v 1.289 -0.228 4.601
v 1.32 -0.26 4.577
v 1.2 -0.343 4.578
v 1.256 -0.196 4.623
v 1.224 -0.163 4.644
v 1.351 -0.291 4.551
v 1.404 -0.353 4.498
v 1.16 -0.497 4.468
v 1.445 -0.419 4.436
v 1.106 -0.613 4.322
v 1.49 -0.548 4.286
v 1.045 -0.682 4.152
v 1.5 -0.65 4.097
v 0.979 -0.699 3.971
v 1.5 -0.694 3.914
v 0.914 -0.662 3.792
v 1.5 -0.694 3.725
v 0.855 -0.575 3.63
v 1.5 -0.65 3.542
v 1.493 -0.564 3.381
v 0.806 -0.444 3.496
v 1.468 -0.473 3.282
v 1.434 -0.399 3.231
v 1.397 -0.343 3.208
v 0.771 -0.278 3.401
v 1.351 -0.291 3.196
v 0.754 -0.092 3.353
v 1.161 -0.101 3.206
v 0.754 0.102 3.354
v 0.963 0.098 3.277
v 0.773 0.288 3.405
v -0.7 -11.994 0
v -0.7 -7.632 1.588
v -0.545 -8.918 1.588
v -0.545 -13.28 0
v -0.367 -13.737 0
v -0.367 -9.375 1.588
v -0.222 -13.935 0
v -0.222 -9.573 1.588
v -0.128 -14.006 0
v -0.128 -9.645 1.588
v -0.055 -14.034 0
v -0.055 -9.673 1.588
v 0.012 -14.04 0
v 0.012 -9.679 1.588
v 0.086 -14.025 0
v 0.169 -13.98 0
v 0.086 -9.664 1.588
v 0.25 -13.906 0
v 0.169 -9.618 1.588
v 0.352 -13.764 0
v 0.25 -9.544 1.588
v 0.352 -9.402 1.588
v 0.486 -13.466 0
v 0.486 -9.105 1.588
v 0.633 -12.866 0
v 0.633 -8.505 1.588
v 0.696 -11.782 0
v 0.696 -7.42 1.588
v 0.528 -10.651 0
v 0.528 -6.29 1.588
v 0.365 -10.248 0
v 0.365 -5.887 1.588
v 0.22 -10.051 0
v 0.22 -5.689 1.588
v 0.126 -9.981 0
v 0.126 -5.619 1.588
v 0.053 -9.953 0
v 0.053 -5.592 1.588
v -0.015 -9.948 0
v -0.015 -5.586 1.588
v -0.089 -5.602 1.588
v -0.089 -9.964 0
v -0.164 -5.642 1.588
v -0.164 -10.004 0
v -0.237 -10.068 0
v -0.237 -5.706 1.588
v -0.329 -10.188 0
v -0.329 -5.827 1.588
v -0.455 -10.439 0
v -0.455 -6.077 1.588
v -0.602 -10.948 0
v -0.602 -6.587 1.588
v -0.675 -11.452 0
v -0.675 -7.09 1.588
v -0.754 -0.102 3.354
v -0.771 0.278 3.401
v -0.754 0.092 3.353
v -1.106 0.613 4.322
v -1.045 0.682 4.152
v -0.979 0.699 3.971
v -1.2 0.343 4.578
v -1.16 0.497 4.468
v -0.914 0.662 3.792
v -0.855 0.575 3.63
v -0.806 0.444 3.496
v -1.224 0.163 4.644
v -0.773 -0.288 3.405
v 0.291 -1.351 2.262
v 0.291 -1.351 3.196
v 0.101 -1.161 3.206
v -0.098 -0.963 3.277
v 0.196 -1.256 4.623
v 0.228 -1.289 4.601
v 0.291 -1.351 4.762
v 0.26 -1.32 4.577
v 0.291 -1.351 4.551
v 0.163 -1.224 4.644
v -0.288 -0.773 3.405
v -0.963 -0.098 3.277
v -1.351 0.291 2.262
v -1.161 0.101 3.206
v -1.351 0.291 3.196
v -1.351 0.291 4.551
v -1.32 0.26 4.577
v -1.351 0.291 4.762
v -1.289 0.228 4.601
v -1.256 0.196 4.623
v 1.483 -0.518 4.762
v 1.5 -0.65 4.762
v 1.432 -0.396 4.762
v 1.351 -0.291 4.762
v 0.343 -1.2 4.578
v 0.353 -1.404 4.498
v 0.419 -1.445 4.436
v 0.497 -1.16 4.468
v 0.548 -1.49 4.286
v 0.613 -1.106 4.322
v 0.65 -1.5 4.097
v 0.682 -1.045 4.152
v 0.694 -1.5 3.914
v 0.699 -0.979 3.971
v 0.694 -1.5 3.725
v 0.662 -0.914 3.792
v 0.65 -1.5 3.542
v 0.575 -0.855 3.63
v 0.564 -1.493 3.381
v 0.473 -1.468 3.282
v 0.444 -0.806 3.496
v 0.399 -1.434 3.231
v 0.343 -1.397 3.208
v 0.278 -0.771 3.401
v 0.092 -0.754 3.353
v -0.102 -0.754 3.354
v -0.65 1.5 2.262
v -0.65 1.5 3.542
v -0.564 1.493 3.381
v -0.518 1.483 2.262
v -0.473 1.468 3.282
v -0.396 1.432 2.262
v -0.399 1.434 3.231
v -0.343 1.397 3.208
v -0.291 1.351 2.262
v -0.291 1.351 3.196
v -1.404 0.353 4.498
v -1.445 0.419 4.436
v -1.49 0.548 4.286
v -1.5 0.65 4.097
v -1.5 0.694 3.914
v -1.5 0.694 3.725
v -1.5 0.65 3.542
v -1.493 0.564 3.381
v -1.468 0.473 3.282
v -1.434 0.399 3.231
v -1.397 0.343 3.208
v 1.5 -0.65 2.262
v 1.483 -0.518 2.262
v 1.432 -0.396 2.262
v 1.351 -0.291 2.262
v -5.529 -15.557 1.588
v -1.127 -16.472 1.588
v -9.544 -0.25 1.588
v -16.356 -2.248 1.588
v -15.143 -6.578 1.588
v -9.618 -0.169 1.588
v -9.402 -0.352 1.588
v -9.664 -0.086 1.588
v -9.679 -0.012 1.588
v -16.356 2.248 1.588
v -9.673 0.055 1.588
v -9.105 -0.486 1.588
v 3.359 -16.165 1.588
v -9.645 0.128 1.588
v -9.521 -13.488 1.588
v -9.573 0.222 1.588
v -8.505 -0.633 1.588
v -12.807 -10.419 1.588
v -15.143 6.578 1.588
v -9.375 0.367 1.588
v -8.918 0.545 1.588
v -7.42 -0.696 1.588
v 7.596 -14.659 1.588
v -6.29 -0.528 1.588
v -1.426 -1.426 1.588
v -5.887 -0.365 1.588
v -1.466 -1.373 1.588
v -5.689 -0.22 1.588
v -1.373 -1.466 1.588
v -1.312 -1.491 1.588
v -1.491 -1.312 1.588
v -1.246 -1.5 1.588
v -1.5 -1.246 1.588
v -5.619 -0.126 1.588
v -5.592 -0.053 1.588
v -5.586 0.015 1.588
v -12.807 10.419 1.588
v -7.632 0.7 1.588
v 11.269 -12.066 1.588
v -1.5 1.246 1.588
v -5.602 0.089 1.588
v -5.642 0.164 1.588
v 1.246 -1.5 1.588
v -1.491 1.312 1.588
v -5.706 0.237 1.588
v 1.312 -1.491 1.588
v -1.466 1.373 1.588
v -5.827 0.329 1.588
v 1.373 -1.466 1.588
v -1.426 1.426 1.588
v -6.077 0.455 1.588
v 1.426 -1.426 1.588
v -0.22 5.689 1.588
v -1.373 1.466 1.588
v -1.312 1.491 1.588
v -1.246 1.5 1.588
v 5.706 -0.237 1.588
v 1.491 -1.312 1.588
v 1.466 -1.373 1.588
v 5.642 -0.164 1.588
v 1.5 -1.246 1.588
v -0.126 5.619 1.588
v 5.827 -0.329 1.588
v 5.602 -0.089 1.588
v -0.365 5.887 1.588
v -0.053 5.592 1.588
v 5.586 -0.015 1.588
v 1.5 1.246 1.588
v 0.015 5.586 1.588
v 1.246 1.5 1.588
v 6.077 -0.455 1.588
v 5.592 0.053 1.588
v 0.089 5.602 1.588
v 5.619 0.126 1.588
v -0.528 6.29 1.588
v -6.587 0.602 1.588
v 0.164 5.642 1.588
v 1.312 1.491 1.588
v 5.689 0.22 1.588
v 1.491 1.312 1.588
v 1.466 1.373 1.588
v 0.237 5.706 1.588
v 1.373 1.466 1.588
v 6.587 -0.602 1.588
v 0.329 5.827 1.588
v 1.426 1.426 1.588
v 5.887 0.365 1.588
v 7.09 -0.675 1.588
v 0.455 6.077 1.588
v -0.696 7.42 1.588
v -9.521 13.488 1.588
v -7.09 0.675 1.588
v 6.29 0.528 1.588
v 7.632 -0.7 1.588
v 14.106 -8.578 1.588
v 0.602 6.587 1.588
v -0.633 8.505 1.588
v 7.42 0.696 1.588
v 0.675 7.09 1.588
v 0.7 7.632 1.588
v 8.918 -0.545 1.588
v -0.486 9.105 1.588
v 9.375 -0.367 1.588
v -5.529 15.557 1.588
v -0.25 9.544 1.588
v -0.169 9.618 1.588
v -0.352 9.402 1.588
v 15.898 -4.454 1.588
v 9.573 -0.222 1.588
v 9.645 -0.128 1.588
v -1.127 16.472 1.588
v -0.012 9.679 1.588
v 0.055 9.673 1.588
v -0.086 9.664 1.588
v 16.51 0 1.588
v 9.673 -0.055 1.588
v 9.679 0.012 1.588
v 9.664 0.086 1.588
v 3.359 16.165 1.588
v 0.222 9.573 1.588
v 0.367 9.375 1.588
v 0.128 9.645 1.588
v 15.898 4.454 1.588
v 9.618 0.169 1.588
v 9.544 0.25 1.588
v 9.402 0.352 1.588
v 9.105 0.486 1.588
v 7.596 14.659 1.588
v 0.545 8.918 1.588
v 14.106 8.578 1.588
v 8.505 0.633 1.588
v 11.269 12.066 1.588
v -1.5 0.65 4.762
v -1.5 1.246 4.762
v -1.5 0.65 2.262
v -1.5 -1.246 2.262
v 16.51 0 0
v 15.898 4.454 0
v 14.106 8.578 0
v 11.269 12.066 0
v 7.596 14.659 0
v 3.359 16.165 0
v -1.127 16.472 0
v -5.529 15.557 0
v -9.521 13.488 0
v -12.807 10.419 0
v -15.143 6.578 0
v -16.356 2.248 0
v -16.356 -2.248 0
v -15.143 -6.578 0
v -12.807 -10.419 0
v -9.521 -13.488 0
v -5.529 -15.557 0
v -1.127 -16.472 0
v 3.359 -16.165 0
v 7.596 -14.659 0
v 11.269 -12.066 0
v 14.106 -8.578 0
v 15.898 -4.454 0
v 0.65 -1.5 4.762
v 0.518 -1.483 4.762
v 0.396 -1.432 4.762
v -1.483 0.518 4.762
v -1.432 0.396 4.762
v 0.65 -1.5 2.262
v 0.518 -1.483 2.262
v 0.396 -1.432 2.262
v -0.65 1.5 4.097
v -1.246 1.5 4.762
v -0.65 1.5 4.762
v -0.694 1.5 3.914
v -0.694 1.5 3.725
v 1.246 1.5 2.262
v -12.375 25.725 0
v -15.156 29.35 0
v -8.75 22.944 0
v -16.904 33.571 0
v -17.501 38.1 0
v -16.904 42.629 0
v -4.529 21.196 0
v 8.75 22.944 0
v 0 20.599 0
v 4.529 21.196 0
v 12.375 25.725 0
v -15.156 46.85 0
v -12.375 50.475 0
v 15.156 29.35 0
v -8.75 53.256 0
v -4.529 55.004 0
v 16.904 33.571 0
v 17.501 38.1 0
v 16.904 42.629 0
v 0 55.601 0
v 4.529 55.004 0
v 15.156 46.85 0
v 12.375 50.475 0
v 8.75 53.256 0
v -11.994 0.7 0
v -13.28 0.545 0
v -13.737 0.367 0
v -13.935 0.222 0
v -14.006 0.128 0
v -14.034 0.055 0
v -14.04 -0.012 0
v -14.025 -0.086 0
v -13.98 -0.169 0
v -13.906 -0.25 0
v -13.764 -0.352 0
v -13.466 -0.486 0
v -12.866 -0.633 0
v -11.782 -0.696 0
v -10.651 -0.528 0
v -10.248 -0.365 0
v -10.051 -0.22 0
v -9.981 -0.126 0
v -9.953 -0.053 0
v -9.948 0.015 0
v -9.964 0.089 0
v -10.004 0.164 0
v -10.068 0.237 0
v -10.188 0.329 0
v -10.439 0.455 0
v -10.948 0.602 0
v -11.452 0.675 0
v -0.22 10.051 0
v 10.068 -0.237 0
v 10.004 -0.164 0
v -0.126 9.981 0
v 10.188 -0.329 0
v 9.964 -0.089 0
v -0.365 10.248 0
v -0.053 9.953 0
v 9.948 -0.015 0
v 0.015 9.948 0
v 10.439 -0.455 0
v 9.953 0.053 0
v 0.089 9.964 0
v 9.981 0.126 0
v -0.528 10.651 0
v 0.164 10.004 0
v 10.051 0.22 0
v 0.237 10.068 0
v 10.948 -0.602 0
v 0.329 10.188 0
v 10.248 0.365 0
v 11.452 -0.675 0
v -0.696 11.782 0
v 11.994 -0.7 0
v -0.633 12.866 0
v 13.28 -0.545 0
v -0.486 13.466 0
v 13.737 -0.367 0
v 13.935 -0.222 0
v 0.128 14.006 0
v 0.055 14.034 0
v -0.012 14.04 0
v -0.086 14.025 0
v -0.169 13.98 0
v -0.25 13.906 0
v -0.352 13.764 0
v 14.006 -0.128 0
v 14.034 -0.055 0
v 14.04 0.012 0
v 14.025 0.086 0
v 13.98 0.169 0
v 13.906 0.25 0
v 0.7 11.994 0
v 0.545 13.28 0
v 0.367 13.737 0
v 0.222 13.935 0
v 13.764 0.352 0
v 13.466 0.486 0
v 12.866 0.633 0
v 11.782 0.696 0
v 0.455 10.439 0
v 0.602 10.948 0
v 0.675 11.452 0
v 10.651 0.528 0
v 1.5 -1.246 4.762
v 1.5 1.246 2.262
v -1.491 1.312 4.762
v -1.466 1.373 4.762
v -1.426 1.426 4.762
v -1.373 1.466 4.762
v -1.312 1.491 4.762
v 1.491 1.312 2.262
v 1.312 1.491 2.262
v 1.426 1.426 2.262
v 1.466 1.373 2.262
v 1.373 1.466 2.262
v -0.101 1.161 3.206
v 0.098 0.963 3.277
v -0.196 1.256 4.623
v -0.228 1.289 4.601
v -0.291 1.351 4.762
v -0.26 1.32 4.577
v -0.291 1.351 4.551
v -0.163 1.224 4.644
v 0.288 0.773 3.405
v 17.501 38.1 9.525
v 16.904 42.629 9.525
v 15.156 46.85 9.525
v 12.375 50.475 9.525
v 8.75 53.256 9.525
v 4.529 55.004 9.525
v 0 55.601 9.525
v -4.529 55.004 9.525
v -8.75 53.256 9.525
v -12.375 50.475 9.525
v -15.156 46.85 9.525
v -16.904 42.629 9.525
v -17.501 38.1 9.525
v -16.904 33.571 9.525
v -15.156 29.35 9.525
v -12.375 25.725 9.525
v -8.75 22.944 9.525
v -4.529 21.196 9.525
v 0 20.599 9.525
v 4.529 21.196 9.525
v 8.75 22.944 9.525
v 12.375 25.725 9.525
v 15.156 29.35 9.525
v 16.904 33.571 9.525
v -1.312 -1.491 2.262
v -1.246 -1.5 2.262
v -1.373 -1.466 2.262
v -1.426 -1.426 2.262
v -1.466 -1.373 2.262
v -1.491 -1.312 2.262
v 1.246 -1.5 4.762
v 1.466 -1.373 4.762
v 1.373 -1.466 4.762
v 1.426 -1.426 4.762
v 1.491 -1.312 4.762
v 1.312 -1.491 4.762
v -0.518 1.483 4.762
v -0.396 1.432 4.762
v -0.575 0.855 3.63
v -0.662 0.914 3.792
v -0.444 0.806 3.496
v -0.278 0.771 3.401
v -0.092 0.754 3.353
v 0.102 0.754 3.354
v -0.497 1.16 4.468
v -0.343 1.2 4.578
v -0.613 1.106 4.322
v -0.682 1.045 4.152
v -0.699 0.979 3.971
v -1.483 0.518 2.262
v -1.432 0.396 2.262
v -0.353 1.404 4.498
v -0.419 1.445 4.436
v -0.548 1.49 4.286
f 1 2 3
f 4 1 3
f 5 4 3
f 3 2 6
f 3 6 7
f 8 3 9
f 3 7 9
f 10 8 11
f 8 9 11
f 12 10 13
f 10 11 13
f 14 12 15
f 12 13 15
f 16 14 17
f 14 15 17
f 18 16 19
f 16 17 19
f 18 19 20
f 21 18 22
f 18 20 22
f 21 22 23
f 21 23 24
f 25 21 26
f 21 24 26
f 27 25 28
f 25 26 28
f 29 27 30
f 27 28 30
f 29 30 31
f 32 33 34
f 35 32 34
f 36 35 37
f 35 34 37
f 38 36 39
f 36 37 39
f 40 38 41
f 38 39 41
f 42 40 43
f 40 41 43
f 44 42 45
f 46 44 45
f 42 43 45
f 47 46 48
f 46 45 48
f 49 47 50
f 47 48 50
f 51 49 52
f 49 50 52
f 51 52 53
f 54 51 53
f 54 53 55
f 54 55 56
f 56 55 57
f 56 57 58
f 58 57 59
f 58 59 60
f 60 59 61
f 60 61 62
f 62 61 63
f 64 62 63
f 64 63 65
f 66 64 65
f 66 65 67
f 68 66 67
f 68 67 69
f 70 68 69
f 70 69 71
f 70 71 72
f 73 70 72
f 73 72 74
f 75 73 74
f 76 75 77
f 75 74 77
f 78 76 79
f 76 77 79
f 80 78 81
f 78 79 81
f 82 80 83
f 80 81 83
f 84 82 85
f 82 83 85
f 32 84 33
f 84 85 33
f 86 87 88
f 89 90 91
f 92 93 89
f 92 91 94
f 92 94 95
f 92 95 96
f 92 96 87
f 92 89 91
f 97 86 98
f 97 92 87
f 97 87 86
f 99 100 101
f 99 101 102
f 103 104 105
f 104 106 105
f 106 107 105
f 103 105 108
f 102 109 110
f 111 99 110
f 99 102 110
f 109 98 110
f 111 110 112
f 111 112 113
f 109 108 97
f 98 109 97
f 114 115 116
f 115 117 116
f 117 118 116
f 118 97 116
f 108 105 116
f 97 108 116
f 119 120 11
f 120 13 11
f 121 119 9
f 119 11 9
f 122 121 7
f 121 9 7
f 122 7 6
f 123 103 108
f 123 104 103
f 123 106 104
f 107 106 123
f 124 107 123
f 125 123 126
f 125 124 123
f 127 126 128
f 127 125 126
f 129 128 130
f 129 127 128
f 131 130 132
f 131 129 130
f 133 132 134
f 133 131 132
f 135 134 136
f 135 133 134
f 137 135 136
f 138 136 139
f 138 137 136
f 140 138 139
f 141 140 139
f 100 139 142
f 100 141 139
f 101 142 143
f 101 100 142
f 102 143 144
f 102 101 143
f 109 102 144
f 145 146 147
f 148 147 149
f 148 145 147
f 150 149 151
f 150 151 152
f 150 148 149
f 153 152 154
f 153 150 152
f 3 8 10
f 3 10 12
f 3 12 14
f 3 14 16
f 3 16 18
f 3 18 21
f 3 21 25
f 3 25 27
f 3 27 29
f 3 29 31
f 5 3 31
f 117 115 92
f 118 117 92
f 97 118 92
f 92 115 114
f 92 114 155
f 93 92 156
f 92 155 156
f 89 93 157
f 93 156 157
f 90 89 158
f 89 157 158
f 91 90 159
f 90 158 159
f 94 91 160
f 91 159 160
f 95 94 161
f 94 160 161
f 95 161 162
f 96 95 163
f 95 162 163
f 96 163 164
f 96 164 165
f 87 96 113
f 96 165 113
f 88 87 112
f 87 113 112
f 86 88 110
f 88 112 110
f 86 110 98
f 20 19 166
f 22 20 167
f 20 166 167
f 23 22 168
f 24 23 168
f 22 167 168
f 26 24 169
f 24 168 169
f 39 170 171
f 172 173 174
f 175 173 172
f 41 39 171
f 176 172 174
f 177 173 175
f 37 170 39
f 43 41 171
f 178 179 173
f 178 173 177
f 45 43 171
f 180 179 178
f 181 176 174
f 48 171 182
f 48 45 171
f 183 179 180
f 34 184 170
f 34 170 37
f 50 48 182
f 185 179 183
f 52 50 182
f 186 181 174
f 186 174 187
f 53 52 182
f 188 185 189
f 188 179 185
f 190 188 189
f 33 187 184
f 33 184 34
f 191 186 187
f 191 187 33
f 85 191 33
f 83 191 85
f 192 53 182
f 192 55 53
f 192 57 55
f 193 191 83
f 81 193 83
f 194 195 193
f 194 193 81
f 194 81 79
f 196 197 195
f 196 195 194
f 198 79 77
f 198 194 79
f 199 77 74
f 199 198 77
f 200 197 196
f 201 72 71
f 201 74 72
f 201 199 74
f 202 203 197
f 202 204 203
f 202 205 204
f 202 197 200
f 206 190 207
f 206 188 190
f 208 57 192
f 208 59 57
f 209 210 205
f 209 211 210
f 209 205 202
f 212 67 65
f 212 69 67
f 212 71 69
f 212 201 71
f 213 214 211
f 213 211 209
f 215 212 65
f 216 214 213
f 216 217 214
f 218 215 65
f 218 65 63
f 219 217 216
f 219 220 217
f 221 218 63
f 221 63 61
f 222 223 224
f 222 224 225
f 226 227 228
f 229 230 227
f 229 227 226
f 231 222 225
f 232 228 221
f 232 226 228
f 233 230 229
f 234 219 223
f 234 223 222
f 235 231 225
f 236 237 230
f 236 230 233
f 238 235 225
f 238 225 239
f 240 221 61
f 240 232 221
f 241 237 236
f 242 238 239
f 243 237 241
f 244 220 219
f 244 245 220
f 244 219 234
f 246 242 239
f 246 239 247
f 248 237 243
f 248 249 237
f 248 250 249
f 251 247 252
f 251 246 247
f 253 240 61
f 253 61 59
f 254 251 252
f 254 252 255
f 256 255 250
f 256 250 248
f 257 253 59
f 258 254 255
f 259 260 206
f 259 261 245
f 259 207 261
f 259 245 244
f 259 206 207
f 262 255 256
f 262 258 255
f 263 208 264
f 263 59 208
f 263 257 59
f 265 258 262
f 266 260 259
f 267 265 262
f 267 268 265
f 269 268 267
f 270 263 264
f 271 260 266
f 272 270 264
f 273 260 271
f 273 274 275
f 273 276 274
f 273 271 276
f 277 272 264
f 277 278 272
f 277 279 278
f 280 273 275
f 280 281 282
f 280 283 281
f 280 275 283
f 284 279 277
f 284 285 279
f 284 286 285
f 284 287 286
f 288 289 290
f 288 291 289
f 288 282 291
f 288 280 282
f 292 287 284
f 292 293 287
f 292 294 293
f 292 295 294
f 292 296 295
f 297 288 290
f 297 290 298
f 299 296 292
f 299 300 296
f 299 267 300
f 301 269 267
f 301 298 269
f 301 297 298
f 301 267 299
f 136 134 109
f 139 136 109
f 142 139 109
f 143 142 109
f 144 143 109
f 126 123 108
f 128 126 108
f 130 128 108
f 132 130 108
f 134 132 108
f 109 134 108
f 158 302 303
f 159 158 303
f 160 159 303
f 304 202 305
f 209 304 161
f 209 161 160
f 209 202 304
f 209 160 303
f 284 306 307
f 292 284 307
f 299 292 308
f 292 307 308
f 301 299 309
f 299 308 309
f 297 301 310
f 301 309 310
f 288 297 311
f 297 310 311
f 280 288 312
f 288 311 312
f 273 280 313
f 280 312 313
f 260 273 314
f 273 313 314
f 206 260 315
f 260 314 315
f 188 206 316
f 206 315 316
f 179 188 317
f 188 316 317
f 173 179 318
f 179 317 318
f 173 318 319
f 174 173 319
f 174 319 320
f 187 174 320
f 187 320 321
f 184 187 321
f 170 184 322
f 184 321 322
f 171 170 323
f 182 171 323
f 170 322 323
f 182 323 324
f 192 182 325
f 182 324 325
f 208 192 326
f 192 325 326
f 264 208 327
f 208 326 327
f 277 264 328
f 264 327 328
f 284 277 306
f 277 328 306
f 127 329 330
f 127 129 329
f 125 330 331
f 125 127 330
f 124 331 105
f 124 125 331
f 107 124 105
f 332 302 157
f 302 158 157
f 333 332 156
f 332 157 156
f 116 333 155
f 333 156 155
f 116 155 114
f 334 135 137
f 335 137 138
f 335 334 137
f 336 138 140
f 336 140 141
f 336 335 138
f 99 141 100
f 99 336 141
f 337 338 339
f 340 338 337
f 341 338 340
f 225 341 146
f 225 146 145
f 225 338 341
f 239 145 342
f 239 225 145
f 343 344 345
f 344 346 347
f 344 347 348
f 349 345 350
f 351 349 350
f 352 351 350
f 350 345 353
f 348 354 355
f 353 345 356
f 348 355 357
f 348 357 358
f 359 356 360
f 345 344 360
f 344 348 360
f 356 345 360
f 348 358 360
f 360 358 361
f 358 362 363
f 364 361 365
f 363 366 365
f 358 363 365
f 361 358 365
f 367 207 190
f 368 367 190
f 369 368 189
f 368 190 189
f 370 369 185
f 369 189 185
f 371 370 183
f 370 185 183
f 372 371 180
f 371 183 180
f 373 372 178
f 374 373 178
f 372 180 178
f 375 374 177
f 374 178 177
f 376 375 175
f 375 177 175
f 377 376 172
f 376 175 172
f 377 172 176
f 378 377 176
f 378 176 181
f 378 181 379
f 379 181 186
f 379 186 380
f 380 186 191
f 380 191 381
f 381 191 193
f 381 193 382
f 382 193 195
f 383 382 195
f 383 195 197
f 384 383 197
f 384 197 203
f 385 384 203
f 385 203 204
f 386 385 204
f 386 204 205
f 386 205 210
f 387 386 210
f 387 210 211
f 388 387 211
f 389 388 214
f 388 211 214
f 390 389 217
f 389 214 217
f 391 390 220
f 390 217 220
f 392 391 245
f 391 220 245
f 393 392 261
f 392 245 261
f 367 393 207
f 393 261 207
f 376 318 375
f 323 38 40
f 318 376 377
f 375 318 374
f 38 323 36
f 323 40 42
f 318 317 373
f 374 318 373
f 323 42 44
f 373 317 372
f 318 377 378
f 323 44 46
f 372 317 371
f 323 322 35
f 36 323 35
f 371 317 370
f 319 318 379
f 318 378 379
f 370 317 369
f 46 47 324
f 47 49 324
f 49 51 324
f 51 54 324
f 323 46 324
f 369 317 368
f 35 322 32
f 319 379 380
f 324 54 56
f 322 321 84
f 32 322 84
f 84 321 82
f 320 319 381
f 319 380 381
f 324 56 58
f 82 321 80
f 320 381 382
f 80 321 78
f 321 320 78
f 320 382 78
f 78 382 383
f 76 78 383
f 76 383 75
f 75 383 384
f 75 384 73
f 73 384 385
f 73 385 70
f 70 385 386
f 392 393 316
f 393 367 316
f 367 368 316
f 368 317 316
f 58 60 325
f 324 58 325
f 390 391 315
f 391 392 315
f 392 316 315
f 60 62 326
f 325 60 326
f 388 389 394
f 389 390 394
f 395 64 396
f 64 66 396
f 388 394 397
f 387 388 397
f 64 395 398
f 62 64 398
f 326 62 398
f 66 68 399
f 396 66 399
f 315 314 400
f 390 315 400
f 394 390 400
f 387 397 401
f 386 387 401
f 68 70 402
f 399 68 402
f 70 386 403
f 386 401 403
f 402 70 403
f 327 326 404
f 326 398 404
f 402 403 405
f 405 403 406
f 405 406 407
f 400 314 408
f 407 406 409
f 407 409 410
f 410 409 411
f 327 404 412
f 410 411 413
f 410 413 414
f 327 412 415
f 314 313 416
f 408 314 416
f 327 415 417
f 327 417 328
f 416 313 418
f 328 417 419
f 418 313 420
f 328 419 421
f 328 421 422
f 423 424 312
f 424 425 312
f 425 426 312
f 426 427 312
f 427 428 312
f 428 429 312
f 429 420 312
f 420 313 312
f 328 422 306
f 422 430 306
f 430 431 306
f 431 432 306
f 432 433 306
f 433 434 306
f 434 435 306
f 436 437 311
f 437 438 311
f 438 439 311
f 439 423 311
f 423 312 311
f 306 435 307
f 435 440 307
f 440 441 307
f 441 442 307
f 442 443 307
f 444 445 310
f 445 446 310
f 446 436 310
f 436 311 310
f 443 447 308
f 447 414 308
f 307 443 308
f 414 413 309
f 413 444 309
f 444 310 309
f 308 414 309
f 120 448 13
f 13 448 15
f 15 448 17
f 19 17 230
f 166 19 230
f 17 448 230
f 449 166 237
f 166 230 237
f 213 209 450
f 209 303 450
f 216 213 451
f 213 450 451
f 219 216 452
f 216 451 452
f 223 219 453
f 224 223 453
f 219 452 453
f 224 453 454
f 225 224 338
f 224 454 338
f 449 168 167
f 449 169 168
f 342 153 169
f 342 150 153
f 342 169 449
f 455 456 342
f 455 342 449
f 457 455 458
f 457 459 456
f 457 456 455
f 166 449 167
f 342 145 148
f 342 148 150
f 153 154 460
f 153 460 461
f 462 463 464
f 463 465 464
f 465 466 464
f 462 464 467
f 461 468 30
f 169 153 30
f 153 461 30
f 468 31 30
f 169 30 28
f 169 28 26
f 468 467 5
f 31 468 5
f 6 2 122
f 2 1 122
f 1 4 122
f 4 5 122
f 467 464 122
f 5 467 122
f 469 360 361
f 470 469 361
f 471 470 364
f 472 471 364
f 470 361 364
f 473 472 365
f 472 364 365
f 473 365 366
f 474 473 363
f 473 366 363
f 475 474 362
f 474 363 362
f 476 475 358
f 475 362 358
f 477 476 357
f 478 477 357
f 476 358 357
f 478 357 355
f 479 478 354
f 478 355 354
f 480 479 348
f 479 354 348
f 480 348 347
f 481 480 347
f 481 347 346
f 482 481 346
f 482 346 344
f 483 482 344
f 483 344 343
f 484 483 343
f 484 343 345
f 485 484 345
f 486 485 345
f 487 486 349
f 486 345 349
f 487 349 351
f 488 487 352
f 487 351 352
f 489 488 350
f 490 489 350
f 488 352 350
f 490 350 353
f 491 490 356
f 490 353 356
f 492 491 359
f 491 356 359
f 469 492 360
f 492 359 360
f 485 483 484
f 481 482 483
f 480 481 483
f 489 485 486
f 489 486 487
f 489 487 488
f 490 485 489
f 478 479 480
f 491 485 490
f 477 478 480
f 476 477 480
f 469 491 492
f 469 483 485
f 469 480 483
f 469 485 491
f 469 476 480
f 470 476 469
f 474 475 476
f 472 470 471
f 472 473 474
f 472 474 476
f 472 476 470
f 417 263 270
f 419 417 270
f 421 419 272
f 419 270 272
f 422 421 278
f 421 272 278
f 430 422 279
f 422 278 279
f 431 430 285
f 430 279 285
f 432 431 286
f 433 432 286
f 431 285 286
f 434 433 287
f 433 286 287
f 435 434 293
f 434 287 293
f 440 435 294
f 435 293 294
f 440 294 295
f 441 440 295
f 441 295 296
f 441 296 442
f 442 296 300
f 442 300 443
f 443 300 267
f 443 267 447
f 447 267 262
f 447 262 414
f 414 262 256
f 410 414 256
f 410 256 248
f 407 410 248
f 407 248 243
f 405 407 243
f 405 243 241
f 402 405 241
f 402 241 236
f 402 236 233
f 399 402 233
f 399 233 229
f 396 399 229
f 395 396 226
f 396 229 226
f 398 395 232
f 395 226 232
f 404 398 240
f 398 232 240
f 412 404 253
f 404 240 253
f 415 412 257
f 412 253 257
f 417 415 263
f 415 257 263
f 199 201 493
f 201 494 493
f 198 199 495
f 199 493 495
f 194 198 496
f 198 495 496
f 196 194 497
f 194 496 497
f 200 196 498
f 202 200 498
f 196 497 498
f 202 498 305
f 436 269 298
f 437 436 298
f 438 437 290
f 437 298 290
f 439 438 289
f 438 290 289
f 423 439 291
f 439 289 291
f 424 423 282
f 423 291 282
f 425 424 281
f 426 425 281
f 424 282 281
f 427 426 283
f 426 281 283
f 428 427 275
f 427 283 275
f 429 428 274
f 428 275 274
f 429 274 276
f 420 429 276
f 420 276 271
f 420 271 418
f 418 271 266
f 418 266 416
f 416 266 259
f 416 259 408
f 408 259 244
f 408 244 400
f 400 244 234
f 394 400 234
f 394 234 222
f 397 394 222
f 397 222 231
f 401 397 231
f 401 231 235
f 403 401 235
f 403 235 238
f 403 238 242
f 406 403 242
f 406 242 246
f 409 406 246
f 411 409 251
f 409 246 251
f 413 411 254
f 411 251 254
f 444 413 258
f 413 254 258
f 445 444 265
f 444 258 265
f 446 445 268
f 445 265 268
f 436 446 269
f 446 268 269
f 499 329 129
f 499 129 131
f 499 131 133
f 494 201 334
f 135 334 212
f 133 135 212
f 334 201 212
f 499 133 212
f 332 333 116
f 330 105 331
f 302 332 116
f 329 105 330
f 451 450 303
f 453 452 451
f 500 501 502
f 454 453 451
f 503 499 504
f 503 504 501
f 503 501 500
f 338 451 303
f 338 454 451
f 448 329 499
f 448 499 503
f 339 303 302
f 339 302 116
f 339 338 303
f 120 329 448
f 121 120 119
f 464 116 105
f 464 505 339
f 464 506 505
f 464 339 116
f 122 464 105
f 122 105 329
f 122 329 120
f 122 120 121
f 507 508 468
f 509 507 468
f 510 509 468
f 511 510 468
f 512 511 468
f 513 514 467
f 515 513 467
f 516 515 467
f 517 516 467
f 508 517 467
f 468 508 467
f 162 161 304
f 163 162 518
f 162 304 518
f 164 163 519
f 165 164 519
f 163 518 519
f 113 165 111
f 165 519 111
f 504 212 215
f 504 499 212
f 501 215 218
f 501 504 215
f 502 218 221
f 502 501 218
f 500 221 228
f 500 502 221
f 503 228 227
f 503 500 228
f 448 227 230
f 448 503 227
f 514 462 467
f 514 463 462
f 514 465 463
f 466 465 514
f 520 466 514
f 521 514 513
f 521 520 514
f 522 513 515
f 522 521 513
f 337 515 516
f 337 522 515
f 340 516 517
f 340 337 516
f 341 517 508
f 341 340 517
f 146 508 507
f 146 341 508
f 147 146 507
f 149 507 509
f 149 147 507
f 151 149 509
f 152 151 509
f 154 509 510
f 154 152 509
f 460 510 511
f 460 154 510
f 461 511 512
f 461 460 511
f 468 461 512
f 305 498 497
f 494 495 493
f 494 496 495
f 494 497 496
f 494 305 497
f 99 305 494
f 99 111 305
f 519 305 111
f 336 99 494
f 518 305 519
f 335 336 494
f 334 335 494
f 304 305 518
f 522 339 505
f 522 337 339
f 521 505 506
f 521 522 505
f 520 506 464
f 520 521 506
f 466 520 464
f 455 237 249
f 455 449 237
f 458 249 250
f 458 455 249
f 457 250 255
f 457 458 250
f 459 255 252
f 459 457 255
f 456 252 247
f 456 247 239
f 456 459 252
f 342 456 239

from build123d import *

# Parameters (mm, degrees)
F0_R              = 16.51
F1_DEPTH          = 1.5875
F2_W              = 3
F2_H              = 3
F3_DEPTH          = 3.175
F9_DEPTH          = 2.5
F10_R             = 17.5006
F11_DEPTH         = 9.525
F16_R             = 0.7
F17_DEPTH         = 1.27
F17_COPIES2_COUNT = 2
F18_DEPTH         = 25.4
F18_COPIES_COUNT  = 4
F19_R             = 0.254
F20_R             = 0.508


# Not quite as in the source:
# - a length typed as a fraction of an inch, garbled in the dataset ("3 / 203.2 mm" for 3/8 in), is restored
# - a pattern or mirror of a feature is missing from the dataset's text; its kind, count and spacing are read off the source's solid


with BuildPart() as f1:
    # F0 (on Top) → F1 (new body)
    with BuildSketch(Plane.XY):
        Circle(F0_R)
    extrude(amount=F1_DEPTH)

    # F2 (on face) → F3 (join)
    with BuildSketch(Plane.XY.offset(1.5875)):
        Rectangle(F2_W, F2_H)
    extrude(amount=F3_DEPTH)

    # F8 (on face) → F9 (cut)
    with BuildSketch(Plane.XY.offset(4.7625)):
        Polygon((-0.4393398282, 1.5), (1.5, -0.4393398282), (1.5, 1.5), align=None)
        Polygon((-1.5, -1.5), (0.4393398282, -1.5), (-1.5, 0.4393398282), align=None)
    extrude(amount=-F9_DEPTH, mode=Mode.SUBTRACT)


with BuildPart() as f11:
    # F10 (on Top) → F11 (new body)
    with BuildSketch(Plane.XY):
        with Locations((0, 38.1)):
            Circle(F10_R)
    extrude(amount=F11_DEPTH)

    # F12: cut F1
    add(f1.part, mode=Mode.SUBTRACT)


with BuildPart() as f1_1:
    add(f1.part)

    # F16 (on offset) → F17 (cut)
    with BuildSketch(Plane(origin=(0, -0.7814718533, -0.2844324935), x_dir=(-1, 0, 0), z_dir=(0, 0.9396926208, 0.3420201433))):
        with Locations((0, 4.102201201)):
            Circle(F16_R)
    f17 = extrude(amount=F17_DEPTH, mode=Mode.SUBTRACT)

    # F17_copies: F17 across plane
    add(f17.mirror(Plane(origin=(0, 0, 0), x_dir=(0.7071067812, 0.7071067812, 0), z_dir=(-0.7071067812, 0.7071067812, 0))), mode=Mode.SUBTRACT)

    # F17_copies1: F17 across plane
    add(f17.mirror(Plane(origin=(0, 0, 0), x_dir=(0.7071067812, -0.7071067812, 0), z_dir=(0.7071067812, 0.7071067812, 0))), mode=Mode.SUBTRACT)

    # F17_copies2: F17 ×2 about axis
    f17_copies2_axis = Axis((0, 0, 0), (0, 0, 1))
    for i in range(1, F17_COPIES2_COUNT):
        add(f17.rotate(f17_copies2_axis, i * 360 / F17_COPIES2_COUNT), mode=Mode.SUBTRACT)

    # F16 (on offset) → F18 (cut)
    with BuildSketch(Plane(origin=(0, -0.7814718533, -0.2844324935), x_dir=(-1, 0, 0), z_dir=(0, 0.9396926208, 0.3420201433))):
        with Locations((0, 4.102201201)):
            Circle(F16_R)
    f18 = extrude(amount=-F18_DEPTH, mode=Mode.SUBTRACT)

    # F18_copies: F18 ×4 about axis
    f18_copies_axis = Axis((0, 0, 0), (0, 0, 1))
    for i in range(1, F18_COPIES_COUNT):
        add(f18.rotate(f18_copies_axis, i * 360 / F18_COPIES_COUNT), mode=Mode.SUBTRACT)

    # F19
    f19_edges = [f1_1.edges().sort_by_distance(p)[0] for p in [
        (1.5, -1.5, 3.175),
        (-1.5, 1.5, 3.175),
        (1.5, 1.5, 1.925),
        (-1.5, -1.5, 1.925),
    ]]
    fillet(f19_edges, radius=F19_R)

    # F20
    f20_edges = [f1_1.edges().sort_by_distance(p)[0] for p in [
        (1.5, -0.43934, 2.751041),
        (1.5, -0.43934, 4.580975),
        (-0.43934, 1.5, 4.580975),
        (-0.43934, 1.5, 2.751041),
        (-1.5, 0.43934, 2.751041),
        (-1.5, 0.43934, 4.580975),
        (0.43934, -1.5, 2.751041),
        (0.43934, -1.5, 4.580975),
    ]]
    fillet(f20_edges, radius=F20_R)


solid = Compound([f11.part, f1_1.part])
